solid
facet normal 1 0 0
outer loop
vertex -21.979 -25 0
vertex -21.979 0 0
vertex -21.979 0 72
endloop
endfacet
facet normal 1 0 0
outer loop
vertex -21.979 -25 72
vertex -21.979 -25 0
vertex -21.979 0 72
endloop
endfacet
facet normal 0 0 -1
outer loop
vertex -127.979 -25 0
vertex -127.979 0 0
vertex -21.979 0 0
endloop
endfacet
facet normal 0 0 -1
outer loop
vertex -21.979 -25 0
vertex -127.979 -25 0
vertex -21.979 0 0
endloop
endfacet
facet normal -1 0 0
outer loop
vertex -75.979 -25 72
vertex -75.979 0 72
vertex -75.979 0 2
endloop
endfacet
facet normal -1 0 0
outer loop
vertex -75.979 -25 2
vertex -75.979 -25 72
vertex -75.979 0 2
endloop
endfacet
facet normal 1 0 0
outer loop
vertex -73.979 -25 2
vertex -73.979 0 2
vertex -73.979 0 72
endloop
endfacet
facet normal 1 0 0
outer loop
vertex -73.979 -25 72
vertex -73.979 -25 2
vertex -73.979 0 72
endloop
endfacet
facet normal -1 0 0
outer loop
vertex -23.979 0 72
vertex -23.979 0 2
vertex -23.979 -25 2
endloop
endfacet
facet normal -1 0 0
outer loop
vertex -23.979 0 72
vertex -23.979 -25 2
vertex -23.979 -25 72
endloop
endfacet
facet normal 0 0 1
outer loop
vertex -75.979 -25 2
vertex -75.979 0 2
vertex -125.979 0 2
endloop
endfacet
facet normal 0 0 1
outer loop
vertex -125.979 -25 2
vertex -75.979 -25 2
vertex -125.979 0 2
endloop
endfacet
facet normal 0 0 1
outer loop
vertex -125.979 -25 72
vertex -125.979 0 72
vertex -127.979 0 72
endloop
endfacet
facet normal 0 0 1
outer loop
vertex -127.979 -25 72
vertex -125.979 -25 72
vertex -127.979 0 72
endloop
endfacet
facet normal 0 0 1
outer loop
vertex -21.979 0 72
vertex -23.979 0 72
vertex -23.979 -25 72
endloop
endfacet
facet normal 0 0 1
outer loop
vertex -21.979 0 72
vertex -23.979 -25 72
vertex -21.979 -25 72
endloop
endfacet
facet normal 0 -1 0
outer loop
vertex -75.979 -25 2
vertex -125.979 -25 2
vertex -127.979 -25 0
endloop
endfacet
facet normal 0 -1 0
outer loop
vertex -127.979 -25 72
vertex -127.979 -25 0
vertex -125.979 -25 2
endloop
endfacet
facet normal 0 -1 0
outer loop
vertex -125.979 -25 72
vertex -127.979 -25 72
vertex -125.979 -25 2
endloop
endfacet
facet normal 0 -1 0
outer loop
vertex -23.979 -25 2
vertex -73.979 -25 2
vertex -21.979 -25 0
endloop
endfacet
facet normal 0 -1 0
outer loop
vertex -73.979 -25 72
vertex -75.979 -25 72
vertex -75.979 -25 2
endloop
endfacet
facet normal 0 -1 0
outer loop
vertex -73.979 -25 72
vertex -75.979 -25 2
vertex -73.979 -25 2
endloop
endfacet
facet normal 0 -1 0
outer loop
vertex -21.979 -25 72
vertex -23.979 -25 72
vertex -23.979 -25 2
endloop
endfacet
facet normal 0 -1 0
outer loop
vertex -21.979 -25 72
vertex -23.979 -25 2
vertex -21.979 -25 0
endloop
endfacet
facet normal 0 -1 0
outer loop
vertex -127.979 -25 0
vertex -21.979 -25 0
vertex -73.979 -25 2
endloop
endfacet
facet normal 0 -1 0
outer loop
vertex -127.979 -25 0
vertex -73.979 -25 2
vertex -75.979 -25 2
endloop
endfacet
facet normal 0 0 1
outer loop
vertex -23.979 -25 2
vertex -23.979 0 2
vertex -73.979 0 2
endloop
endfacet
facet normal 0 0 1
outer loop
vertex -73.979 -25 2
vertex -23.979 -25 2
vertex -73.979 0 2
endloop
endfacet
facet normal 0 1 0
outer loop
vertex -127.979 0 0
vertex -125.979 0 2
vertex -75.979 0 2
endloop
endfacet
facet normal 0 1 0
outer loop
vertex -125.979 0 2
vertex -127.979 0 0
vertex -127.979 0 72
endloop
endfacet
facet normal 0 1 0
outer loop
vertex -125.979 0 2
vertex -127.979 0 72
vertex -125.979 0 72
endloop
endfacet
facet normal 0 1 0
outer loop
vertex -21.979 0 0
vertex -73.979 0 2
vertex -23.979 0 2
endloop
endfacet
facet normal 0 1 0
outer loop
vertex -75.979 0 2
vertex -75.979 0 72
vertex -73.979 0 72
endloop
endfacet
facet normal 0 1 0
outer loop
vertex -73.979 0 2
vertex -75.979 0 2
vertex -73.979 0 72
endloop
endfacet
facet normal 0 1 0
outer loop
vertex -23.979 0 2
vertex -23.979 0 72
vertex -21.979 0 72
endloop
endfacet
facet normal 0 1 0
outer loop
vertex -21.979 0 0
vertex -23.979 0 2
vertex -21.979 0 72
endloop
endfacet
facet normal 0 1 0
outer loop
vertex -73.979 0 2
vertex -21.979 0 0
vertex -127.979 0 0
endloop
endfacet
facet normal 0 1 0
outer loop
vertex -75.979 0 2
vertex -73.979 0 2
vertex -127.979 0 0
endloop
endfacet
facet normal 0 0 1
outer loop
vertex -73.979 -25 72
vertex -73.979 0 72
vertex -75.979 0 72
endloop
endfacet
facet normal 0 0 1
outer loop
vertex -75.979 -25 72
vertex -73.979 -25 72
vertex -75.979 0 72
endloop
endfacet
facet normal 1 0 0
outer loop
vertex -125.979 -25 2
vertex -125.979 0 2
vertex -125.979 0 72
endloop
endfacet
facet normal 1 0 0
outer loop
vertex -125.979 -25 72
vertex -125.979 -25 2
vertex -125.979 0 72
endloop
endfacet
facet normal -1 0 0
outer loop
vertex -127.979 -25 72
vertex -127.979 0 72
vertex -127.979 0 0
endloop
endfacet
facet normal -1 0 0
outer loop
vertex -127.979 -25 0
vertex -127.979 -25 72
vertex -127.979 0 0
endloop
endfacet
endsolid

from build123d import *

# Parameters (mm, degrees)
F0_W     = 2
F0_H     = 70
F1_DEPTH = 25


with BuildPart() as f1:
    # F0 (on Front) → F1 (new body)
    with BuildSketch(Plane.XZ):
        Polygon((-127.978955, 72), (-127.978955, 0), (-21.978955, 0), (-21.978955, 2), (-23.978955, 2), (-73.978955, 2), (-73.978955, 72), (-75.978955, 72), (-75.978955, 2), (-125.978955, 2), (-125.978955, 72), align=None)
        with Locations((-22.978955, 37)):
            Rectangle(F0_W, F0_H)
    extrude(amount=F1_DEPTH)


solid = f1.part
